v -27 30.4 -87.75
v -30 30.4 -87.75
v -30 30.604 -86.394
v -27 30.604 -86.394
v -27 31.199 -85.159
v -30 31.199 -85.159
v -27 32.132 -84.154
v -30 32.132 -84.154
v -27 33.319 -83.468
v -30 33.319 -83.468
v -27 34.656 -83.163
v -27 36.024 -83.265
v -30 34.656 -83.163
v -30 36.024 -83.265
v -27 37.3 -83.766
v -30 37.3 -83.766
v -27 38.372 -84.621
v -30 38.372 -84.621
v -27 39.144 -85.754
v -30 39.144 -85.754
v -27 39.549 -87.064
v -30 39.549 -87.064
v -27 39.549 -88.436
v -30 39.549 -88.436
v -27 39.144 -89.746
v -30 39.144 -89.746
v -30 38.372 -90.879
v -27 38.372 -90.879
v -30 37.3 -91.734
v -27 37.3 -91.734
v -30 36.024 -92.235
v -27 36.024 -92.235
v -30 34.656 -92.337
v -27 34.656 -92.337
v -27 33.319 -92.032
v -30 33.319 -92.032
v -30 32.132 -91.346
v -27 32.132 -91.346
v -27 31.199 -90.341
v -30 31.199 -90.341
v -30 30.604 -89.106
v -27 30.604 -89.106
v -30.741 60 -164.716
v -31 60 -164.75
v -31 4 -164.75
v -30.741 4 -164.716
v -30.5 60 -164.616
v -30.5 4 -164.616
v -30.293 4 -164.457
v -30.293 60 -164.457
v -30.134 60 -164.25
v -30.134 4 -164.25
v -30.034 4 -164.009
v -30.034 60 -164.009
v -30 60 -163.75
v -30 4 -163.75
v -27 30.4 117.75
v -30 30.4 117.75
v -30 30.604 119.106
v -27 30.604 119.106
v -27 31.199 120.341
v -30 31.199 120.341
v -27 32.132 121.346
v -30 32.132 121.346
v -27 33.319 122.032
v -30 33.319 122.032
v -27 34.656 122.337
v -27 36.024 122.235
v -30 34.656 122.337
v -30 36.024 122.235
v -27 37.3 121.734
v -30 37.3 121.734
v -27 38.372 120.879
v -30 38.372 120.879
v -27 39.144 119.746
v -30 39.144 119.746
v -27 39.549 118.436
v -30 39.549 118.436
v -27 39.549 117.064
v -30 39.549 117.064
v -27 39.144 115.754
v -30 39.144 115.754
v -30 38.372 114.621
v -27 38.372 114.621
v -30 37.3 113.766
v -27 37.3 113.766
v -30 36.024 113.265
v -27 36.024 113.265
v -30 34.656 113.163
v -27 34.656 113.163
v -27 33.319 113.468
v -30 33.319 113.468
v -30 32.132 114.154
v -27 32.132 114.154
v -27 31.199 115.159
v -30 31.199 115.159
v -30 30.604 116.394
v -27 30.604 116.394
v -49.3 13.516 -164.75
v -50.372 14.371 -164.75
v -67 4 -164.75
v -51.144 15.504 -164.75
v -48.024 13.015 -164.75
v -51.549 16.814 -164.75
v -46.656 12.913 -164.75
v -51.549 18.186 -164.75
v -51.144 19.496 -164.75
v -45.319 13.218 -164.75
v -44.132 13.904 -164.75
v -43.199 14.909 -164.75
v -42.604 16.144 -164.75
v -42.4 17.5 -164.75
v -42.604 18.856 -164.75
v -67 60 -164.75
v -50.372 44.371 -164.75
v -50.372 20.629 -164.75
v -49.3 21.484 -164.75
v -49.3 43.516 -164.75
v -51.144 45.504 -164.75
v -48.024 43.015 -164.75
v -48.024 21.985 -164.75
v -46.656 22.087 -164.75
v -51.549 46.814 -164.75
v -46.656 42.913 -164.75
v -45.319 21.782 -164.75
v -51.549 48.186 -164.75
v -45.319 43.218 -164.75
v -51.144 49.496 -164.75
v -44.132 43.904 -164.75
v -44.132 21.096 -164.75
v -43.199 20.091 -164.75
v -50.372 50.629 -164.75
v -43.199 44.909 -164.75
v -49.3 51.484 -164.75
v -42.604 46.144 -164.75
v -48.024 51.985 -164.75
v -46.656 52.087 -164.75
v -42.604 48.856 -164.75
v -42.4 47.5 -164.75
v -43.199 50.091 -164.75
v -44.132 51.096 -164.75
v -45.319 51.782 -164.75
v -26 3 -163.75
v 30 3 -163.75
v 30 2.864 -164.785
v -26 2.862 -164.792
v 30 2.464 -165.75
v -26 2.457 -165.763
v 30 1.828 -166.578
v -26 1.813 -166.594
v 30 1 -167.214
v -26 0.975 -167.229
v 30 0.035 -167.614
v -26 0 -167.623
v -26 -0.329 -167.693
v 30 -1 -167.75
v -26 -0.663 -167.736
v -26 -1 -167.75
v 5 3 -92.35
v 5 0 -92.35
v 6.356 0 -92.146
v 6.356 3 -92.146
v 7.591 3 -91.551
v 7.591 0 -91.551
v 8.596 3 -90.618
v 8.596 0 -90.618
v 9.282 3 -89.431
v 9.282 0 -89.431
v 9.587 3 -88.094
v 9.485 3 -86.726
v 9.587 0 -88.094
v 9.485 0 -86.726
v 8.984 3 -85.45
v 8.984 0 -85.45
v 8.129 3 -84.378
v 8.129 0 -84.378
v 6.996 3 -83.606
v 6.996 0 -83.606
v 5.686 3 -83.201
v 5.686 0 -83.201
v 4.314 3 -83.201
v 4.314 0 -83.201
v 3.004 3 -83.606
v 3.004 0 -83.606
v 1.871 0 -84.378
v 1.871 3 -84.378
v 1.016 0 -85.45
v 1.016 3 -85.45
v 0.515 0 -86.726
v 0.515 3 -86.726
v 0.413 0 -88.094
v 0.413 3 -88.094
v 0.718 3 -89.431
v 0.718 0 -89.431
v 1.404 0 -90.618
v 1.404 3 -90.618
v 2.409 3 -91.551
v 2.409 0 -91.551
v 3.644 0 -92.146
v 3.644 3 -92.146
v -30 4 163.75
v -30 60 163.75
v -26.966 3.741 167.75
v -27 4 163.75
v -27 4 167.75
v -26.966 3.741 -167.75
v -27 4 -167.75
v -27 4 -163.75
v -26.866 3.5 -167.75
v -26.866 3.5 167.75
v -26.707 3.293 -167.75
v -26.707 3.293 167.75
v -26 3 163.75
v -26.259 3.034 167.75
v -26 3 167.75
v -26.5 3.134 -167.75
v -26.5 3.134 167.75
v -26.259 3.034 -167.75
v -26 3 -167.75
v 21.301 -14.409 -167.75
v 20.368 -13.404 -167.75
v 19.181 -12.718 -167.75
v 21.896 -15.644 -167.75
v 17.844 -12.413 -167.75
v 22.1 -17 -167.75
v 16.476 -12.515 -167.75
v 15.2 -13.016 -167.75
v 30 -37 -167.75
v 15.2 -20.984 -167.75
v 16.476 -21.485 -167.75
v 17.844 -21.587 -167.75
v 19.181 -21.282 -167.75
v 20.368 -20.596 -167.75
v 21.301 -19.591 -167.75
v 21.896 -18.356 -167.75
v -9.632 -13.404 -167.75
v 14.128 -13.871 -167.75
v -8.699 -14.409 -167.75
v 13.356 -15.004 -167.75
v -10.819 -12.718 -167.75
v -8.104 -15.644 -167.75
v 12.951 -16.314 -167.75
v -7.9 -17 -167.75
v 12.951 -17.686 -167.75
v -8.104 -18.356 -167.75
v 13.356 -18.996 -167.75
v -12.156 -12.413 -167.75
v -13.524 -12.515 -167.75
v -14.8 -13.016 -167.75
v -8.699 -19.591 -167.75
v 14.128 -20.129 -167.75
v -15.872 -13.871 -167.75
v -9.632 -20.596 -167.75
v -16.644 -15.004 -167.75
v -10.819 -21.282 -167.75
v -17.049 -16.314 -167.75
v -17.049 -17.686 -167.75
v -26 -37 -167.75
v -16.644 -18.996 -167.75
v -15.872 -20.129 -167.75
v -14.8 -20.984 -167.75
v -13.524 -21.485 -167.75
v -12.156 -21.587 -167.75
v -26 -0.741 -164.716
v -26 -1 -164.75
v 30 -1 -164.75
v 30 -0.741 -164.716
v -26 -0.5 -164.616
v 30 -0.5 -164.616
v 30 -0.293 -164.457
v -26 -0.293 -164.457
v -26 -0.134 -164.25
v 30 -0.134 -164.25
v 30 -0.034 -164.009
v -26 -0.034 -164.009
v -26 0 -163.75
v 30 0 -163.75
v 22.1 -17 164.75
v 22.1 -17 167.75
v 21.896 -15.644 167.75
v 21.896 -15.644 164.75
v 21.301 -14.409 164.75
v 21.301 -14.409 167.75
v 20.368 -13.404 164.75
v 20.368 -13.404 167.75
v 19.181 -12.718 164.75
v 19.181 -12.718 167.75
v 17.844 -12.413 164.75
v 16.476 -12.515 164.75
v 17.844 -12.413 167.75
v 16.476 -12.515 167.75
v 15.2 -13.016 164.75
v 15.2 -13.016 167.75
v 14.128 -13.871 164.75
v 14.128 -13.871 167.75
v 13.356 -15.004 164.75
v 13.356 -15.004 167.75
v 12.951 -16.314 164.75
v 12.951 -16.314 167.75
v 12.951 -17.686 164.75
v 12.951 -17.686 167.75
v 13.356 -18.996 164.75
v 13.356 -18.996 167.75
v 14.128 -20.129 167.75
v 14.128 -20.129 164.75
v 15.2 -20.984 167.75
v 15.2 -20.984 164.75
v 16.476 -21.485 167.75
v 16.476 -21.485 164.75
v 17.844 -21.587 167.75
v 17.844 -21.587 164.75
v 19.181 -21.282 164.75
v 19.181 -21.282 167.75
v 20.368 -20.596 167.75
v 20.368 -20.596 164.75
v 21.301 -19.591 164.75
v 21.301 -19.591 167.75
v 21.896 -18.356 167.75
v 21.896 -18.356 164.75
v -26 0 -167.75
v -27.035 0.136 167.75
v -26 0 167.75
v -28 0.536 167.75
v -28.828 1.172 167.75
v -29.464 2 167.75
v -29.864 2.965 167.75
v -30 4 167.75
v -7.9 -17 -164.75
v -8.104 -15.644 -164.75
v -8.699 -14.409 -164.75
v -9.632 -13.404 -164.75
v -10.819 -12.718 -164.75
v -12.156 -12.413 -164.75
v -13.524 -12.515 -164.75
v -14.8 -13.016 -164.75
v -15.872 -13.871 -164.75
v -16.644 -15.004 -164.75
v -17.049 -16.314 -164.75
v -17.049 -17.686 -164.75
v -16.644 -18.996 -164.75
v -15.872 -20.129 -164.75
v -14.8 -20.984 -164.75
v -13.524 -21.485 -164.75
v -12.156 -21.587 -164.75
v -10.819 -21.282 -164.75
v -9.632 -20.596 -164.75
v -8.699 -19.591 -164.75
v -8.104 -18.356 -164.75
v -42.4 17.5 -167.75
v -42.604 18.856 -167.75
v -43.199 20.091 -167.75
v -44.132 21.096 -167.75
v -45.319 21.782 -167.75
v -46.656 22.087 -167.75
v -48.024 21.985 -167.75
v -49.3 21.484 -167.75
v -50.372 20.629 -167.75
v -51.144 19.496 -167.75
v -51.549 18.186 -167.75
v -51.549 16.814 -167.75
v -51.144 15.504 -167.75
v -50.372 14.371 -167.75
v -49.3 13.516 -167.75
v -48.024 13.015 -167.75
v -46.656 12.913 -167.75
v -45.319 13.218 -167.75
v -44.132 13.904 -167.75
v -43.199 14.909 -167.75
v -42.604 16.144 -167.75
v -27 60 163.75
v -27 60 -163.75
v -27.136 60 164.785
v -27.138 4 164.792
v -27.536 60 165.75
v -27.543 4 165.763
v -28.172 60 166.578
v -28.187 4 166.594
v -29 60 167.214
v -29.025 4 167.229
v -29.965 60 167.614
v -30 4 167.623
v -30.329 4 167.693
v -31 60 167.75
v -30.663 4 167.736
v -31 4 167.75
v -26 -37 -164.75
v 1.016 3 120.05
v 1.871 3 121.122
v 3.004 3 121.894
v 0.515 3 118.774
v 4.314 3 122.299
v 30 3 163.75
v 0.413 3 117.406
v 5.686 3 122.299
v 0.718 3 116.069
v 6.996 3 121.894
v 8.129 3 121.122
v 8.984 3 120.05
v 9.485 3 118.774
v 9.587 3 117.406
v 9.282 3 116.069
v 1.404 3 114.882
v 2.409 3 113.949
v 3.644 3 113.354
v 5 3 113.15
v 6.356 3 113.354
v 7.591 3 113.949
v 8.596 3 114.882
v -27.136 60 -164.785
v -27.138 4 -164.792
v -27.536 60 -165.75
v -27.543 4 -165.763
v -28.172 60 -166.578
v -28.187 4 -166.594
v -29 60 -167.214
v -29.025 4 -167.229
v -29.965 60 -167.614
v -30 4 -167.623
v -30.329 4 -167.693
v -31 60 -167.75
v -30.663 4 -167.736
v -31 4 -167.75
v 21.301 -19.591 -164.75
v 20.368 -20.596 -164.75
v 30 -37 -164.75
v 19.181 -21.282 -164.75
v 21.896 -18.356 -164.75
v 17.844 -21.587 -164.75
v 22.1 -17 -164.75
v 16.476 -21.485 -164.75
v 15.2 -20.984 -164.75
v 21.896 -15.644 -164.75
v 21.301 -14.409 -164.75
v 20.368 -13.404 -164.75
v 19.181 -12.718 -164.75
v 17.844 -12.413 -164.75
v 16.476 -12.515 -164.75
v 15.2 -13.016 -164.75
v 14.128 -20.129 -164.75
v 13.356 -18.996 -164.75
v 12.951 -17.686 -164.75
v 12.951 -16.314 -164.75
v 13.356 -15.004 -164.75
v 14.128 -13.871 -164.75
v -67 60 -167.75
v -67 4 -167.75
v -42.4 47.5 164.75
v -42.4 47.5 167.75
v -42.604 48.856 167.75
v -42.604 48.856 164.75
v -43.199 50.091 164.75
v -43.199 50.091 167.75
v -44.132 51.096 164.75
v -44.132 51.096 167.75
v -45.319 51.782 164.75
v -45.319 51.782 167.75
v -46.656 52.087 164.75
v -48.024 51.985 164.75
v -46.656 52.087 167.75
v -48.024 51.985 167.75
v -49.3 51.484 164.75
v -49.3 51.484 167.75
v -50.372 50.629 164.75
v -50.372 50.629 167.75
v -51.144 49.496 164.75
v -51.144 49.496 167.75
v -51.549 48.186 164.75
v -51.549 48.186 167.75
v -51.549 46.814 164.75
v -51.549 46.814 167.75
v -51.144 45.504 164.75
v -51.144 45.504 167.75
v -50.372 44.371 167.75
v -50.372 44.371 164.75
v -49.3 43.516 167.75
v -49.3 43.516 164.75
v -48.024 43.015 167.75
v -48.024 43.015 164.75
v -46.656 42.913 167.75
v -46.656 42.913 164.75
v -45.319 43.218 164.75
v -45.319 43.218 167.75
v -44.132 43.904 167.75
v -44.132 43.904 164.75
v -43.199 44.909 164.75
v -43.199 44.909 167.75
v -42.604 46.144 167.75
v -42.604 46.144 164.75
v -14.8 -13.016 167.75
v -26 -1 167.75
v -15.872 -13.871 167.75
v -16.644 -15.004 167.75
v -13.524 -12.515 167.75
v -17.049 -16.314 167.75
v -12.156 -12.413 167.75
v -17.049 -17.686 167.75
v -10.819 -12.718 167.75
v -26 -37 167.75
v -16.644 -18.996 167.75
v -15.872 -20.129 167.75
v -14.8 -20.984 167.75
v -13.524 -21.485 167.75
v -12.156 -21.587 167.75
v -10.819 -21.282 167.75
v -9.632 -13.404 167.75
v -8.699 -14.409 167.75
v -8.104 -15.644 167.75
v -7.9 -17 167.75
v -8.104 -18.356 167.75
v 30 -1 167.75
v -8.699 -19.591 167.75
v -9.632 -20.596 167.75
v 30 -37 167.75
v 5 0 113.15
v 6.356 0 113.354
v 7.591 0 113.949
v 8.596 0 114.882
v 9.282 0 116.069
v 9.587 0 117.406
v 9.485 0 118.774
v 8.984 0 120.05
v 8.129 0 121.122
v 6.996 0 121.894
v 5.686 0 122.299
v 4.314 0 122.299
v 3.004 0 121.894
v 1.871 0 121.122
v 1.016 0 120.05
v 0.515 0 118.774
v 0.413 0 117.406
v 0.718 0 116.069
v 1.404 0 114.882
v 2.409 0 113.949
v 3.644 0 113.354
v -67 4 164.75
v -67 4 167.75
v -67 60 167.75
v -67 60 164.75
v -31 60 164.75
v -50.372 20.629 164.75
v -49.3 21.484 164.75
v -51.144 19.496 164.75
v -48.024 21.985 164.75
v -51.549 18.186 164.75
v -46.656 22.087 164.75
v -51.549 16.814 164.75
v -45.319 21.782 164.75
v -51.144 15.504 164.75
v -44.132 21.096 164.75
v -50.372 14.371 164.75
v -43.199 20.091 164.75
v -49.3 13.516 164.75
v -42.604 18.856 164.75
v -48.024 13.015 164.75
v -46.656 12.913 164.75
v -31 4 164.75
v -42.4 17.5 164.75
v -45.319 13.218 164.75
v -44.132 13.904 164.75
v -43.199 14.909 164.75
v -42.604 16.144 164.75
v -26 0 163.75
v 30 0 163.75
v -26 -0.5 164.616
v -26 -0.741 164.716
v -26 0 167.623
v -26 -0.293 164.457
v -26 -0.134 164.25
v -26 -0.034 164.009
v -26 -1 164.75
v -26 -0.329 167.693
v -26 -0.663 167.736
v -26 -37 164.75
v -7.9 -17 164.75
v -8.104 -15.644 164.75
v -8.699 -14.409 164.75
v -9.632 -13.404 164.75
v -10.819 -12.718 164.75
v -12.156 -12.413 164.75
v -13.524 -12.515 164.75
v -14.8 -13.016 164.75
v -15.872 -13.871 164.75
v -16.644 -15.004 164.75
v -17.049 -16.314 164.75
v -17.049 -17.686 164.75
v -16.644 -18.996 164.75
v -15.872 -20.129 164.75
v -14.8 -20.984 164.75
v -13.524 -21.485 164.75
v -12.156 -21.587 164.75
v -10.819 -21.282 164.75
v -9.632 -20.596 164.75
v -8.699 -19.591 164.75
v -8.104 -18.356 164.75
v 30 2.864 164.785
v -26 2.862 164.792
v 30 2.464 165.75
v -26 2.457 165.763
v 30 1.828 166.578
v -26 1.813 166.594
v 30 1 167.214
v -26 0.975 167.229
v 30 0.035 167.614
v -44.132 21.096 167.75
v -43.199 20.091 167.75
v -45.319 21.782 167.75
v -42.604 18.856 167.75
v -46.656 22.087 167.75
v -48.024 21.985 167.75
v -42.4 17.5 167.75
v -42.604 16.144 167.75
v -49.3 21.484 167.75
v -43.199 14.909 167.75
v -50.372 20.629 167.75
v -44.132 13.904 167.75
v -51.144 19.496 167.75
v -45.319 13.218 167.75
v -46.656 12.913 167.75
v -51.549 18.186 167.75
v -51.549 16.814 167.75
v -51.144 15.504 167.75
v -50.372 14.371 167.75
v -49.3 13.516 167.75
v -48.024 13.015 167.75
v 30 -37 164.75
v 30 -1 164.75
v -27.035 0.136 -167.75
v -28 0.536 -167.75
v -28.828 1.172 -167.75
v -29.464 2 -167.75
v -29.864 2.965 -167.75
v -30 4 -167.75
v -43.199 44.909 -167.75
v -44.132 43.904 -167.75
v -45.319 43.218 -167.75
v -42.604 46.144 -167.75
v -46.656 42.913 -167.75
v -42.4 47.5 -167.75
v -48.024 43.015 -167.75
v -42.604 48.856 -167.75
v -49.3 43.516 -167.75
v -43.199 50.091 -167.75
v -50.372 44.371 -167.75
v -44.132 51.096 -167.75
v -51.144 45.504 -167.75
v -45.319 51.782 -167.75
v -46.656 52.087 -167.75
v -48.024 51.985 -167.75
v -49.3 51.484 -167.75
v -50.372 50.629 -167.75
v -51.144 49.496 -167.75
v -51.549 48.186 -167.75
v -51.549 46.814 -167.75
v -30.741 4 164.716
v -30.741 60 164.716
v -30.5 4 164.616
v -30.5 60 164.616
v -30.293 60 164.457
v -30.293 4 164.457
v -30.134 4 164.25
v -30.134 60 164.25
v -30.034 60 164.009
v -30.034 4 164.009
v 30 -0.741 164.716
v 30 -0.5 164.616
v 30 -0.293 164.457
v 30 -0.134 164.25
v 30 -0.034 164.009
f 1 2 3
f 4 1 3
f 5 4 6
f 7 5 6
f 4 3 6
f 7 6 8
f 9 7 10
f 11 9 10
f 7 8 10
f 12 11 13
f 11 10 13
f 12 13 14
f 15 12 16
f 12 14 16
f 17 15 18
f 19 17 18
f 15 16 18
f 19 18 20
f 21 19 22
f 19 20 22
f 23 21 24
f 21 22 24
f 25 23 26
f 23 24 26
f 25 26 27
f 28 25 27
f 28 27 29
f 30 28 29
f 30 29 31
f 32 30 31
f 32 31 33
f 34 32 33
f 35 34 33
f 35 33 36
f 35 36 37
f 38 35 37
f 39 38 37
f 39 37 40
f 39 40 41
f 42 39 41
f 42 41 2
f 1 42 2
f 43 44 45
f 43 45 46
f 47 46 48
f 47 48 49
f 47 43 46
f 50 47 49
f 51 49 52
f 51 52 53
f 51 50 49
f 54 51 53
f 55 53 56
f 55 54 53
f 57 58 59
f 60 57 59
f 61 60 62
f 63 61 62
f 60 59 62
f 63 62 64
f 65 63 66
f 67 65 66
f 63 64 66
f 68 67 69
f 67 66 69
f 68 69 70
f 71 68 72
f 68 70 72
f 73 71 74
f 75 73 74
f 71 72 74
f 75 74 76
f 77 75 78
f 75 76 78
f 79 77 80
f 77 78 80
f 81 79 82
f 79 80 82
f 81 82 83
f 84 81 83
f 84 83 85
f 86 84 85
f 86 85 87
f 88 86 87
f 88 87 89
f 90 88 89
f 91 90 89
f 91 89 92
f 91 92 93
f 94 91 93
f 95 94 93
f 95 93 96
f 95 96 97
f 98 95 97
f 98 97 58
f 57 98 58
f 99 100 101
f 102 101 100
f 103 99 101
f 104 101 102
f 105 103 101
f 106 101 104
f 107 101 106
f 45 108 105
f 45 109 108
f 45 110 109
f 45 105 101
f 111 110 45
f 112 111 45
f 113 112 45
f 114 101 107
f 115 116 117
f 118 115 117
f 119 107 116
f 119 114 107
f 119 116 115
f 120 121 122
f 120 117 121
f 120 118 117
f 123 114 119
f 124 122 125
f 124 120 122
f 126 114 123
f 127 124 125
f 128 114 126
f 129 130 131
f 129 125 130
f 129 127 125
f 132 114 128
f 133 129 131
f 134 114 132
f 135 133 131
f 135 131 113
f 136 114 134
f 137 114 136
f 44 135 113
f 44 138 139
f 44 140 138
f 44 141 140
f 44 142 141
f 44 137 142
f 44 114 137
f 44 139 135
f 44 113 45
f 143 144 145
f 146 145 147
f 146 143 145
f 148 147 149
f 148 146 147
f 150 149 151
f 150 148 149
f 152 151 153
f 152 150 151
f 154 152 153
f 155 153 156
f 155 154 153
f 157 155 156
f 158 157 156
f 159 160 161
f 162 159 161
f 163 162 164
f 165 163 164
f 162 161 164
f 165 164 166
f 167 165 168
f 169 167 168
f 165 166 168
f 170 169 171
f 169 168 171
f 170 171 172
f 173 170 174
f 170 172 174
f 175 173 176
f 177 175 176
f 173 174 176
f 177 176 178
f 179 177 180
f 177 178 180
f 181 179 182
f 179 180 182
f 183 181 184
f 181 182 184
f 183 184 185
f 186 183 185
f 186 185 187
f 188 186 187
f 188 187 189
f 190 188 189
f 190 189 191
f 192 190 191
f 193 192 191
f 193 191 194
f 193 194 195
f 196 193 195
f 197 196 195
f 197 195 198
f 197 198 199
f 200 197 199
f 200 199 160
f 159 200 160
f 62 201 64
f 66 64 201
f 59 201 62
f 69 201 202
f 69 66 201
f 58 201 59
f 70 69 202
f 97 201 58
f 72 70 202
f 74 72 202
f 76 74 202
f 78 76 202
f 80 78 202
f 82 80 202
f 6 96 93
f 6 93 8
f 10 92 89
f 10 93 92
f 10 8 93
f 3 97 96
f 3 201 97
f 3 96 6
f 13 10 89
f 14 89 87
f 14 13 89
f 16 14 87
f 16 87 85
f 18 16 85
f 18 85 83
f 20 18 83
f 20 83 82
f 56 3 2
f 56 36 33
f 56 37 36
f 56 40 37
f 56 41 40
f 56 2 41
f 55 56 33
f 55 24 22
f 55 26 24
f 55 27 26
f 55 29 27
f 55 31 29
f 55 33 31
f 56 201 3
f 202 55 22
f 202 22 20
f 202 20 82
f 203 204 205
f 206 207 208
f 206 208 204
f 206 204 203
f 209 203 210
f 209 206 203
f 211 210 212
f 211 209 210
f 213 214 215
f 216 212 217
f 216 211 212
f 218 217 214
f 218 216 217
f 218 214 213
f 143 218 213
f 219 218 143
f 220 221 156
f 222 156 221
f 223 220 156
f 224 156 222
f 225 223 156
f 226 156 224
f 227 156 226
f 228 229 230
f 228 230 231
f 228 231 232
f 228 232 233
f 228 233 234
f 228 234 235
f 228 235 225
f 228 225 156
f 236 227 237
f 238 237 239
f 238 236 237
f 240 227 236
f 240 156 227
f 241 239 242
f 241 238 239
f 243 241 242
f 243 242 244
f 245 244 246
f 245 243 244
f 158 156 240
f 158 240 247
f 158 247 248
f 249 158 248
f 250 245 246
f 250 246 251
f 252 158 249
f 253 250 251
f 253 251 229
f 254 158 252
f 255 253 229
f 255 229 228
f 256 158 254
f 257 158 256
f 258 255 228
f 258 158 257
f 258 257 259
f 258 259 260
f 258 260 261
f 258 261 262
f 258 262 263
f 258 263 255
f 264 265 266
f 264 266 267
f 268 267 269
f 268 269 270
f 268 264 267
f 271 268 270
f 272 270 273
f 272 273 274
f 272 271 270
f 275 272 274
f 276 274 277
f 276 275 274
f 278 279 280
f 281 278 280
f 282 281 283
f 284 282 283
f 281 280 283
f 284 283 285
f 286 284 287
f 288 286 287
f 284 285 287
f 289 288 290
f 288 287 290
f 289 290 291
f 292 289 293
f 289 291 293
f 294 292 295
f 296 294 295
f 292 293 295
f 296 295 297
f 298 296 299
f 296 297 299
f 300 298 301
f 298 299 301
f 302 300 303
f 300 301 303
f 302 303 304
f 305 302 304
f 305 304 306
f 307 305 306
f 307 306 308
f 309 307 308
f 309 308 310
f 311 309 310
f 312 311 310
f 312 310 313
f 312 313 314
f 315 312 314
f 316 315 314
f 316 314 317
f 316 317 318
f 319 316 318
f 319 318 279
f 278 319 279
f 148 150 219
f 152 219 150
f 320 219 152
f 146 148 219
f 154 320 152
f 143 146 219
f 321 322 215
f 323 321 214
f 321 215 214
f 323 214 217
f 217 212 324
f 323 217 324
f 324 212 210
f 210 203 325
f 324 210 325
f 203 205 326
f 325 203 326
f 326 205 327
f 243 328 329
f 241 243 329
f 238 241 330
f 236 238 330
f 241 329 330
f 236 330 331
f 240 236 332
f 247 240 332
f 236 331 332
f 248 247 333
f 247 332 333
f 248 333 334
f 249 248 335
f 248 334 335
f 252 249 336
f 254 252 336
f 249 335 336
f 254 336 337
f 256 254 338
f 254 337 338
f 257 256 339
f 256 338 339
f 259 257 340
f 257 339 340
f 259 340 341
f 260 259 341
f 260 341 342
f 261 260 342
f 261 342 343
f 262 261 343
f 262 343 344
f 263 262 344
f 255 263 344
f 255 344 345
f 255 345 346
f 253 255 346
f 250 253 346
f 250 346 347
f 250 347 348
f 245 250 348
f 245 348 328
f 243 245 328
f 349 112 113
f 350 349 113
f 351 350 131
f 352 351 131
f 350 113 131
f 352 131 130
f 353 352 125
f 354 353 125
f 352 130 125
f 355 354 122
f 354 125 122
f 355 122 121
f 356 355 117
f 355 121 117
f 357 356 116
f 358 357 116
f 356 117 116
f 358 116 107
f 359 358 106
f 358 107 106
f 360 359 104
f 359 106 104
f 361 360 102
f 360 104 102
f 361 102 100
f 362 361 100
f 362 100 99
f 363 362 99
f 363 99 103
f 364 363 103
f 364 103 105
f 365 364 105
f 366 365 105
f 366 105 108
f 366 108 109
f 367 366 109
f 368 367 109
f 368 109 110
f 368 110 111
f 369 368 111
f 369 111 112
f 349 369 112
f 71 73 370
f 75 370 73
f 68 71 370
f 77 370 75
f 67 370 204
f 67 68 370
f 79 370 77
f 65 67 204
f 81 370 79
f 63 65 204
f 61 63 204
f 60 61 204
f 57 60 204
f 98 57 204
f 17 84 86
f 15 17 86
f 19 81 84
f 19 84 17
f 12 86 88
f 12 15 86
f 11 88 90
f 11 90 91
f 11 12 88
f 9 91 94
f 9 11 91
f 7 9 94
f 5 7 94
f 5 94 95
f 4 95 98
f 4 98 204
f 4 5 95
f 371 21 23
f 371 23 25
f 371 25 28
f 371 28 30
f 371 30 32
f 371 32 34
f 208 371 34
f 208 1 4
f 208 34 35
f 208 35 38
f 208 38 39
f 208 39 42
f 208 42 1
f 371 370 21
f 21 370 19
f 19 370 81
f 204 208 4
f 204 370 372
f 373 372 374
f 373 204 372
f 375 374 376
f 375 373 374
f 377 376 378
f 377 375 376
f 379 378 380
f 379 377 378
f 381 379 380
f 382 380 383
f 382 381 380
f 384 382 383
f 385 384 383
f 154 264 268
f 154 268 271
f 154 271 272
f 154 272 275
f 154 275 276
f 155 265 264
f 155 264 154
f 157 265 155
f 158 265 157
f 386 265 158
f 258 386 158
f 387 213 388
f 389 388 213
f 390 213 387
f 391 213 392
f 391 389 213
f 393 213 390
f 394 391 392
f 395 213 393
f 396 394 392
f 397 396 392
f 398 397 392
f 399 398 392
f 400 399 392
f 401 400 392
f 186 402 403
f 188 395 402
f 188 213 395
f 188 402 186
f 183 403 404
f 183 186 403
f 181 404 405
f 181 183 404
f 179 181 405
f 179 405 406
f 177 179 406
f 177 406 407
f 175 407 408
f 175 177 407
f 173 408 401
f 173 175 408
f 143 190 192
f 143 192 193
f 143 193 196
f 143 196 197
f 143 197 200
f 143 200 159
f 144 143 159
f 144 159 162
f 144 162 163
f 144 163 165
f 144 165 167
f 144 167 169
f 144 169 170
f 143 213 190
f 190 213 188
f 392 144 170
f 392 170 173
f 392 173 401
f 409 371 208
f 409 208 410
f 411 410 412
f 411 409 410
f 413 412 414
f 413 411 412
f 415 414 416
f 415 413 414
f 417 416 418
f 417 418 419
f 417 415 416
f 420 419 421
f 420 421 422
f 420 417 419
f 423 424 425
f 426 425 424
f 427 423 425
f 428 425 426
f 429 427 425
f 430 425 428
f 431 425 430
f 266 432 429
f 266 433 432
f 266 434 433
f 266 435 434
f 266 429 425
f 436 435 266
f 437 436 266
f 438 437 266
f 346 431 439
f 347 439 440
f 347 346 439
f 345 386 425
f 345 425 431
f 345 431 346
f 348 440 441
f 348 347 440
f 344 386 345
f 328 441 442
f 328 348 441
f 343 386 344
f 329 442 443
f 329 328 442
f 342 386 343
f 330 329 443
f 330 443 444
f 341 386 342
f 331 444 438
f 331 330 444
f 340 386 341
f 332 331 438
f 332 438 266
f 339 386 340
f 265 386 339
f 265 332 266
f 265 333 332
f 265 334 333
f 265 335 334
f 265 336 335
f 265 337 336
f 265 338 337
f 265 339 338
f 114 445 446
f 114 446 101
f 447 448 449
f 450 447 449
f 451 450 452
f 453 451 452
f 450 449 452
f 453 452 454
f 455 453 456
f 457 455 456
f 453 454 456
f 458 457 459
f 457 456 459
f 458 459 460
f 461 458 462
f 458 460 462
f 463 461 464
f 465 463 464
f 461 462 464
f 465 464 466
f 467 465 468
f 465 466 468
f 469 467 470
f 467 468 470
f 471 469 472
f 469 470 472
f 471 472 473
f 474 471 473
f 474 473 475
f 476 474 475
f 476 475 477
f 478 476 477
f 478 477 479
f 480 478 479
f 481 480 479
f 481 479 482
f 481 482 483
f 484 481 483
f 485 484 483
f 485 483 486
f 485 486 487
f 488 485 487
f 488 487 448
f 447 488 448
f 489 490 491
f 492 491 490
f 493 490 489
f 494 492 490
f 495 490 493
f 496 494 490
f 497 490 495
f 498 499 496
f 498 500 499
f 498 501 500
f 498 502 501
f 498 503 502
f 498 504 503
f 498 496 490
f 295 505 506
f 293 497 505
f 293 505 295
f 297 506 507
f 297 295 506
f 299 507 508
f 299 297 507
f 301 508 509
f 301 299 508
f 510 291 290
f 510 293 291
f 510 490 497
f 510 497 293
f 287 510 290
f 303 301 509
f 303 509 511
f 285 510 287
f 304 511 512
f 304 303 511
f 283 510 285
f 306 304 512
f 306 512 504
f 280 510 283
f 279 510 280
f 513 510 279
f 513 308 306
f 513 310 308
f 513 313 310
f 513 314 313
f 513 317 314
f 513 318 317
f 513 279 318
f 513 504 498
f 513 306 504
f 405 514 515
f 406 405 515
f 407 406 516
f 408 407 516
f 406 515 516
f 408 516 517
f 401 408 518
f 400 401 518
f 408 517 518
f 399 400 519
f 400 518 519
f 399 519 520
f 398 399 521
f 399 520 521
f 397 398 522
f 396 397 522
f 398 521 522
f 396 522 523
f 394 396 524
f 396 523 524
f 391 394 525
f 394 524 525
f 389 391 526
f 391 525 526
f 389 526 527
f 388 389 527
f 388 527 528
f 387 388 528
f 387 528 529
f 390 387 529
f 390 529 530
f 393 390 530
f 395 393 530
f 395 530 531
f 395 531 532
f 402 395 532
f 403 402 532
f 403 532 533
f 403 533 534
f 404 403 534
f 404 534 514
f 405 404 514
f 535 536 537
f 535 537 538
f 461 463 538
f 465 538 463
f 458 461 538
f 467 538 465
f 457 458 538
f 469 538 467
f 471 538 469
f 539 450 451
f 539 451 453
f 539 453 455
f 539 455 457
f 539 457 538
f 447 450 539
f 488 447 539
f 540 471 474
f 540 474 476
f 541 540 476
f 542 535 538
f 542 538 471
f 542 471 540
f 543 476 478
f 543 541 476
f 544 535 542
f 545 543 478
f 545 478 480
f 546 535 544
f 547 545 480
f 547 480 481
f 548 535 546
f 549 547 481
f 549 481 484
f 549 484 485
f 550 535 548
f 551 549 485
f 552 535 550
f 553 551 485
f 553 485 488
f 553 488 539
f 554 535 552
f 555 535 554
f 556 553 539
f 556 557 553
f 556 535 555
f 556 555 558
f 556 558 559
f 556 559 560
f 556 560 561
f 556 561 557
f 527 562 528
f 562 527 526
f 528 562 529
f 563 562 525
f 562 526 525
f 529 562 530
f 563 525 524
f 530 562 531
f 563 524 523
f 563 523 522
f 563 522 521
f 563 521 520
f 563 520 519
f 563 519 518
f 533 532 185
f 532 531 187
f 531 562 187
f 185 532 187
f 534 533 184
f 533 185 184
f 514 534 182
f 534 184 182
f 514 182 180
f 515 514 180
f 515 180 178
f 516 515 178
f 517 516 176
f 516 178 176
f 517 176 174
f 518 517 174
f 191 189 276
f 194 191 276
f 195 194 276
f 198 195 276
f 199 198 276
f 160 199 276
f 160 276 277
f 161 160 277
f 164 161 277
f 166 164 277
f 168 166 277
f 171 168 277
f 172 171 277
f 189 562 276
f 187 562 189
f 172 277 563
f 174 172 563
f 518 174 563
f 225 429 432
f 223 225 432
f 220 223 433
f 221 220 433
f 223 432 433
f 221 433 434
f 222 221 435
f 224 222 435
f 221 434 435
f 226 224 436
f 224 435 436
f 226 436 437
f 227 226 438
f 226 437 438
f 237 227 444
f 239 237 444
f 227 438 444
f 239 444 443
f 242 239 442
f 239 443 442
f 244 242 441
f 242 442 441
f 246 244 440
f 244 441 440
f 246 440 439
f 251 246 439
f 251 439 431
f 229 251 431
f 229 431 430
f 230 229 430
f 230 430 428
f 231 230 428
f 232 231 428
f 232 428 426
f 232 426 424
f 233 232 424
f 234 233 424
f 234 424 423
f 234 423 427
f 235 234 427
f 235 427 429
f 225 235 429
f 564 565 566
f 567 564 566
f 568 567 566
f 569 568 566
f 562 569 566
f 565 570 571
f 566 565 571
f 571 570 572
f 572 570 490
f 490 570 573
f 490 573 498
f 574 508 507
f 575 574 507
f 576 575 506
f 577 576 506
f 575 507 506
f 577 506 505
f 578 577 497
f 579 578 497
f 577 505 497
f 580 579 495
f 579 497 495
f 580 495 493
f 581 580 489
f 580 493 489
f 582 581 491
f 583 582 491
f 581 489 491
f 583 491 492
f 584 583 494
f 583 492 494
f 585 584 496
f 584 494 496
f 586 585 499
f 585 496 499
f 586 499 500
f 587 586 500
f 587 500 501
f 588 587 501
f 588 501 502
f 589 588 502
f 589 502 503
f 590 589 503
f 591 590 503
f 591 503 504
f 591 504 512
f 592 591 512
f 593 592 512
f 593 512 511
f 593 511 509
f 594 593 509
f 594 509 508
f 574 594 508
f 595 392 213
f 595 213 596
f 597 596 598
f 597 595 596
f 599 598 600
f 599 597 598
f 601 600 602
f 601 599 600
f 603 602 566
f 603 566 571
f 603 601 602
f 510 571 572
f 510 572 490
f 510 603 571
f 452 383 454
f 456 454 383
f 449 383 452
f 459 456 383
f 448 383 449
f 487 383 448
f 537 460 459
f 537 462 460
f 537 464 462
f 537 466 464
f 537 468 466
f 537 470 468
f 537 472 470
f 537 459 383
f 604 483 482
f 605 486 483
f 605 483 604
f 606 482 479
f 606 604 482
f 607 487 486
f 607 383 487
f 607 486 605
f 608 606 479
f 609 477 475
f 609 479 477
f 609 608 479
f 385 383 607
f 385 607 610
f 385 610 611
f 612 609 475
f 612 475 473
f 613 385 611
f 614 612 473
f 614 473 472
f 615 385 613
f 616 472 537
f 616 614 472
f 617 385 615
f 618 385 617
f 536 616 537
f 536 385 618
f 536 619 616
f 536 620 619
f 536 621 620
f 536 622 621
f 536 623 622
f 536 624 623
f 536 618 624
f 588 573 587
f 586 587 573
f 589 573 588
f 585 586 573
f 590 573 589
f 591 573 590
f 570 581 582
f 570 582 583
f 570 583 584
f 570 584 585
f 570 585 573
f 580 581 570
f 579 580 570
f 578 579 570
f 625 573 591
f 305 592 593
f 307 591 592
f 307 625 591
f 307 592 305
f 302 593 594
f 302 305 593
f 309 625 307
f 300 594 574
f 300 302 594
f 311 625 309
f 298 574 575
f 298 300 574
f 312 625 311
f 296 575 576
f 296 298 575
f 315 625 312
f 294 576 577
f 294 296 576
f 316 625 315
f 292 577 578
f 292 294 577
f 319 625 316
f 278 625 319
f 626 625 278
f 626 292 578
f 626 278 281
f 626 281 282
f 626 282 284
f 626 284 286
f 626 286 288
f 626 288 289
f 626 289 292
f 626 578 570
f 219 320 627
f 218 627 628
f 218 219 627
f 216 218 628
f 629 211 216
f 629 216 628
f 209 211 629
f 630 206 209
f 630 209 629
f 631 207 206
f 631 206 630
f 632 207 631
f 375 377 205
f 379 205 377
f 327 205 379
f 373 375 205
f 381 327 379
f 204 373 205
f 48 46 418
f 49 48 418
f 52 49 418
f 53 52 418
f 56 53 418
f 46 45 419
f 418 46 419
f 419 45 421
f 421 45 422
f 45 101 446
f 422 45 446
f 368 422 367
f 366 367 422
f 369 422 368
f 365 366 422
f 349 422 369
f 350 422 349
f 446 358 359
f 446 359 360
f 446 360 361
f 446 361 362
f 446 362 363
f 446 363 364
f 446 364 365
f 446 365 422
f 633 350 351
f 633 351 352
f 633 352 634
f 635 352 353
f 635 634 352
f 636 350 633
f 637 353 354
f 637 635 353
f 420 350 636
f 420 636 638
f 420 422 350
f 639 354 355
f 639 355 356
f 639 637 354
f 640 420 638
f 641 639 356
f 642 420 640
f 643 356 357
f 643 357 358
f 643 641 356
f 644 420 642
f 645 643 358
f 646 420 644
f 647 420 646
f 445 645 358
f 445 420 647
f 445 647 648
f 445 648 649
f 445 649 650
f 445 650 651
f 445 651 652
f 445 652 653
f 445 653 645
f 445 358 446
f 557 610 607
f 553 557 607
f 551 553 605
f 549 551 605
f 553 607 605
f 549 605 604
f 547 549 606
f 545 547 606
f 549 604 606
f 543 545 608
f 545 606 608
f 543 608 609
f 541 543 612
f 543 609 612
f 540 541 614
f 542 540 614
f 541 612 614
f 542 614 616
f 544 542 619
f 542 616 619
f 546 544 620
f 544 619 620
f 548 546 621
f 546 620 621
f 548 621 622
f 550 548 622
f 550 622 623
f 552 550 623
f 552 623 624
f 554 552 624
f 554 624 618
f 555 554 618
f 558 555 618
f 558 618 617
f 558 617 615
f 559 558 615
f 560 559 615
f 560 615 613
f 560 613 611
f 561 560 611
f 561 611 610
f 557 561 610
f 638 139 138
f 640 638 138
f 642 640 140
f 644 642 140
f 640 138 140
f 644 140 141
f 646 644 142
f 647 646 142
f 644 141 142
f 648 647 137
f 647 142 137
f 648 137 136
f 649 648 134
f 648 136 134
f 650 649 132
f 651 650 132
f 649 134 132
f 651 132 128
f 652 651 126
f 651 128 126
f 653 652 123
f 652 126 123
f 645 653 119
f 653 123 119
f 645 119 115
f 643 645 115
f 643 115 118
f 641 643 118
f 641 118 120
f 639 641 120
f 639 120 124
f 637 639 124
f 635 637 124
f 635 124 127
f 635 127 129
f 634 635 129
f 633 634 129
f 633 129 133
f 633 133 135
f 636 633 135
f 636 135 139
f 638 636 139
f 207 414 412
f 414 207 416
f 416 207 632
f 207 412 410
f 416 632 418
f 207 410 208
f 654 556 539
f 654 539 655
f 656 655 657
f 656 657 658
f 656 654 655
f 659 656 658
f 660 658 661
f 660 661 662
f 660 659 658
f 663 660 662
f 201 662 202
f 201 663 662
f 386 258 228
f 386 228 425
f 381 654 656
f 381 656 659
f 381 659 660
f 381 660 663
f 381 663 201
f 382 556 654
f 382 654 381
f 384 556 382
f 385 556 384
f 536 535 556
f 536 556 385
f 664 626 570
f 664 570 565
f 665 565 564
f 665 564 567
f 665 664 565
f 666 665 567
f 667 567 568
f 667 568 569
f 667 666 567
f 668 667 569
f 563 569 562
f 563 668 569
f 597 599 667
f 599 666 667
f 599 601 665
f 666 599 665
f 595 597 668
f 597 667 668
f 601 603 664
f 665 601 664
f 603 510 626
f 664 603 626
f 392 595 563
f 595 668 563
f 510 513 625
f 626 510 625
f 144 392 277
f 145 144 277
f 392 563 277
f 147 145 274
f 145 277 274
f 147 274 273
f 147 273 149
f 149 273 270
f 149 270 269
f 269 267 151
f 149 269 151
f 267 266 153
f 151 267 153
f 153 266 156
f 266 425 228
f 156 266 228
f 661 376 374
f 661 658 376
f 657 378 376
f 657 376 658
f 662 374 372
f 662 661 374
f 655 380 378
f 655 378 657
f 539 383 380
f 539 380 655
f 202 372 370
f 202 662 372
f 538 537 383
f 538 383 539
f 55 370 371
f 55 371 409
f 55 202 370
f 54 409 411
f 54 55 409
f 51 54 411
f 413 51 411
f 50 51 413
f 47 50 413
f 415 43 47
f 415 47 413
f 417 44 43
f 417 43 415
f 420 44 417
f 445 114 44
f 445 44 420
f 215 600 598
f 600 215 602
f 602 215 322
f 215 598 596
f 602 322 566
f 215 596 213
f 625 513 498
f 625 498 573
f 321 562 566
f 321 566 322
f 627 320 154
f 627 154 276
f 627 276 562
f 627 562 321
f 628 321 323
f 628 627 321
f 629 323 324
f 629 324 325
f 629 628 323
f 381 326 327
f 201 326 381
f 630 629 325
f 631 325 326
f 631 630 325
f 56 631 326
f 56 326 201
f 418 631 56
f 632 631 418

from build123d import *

# Parameters (mm, degrees)
SKETCH1_W                      = 60
SKETCH1_H                      = 335.5
BASE_FLANGE1_DEPTH             = 3
EDGE_FLANGE1_STRIP_W           = 14
EDGE_FLANGE1_STRIP_H           = 3
EDGE_FLANGE1_STRIP_CUT_DEPTH   = 335.5
EDGE_FLANGE1_DEPTH             = 335.5
EDGE_FLANGE2_STRIP_W           = 14
EDGE_FLANGE2_STRIP_H           = 3
EDGE_FLANGE2_STRIP_CUT_DEPTH   = 56
EDGE_FLANGE2_STRIP_2_W         = 14
EDGE_FLANGE2_STRIP_2_H         = 3
EDGE_FLANGE2_STRIP_CUT_2_DEPTH = 56
EDGE_FLANGE2_STRIP_3_W         = 14
EDGE_FLANGE2_STRIP_3_H         = 3
EDGE_FLANGE2_STRIP_CUT_3_DEPTH = 56
EDGE_FLANGE2_STRIP_4_W         = 14
EDGE_FLANGE2_STRIP_4_H         = 3
EDGE_FLANGE2_STRIP_CUT_4_DEPTH = 56
EDGE_FLANGE2_DEPTH             = 56
EDGE_FLANGE2_BEND_DEPTH        = 56
EDGE_FLANGE2_BEND_2_DEPTH      = 56
EDGE_FLANGE2_BEND_3_DEPTH      = 56
SKETCH18_R                     = 4.6
EXTRUDE1_DEPTH                 = 348.346009046
SKETCH21_R                     = 4.6
CUT_EXTRUDE1_DEPTH             = 10
SKETCH22_R                     = 4.6
CUT_EXTRUDE2_DEPTH             = 10


# Sheet-metal steps are written as plain solids
with BuildPart() as part:
    # Sketch1 → Base-Flange1 (new body)
    with BuildSketch(Plane(origin=(0, 0, 0), x_dir=(1, 0, 0), z_dir=(0, 1, 0))):
        Rectangle(SKETCH1_W, SKETCH1_H)
    extrude(amount=BASE_FLANGE1_DEPTH)

    # Edge-Flange1 strip (across the edge) → Edge-Flange1 strip cut (cut)
    with BuildSketch(Plane(origin=(-30, 3, -167.75), x_dir=(1, 0, 0), z_dir=(0, 0, 1))):
        with Locations((-3, -1.5)):
            Rectangle(EDGE_FLANGE1_STRIP_W, EDGE_FLANGE1_STRIP_H)
    extrude(amount=EDGE_FLANGE1_STRIP_CUT_DEPTH, mode=Mode.SUBTRACT)

    # Edge-Flange1 section (across the edge) → Edge-Flange1 (add)
    with BuildSketch(Plane(origin=(-30, 3, -167.75), x_dir=(1, 0, 0), z_dir=(0, 0, 1))):
        with BuildLine():
            Line((0, 1), (0, 57))
            Line((0, 57), (3, 57))
            Line((3, 57), (3, 1))
            ThreePointArc((3, 1), (3.292893219, 0.292893219), (4, 0))
            Line((4, 0), (4, -3))
            ThreePointArc((4, -3), (1.171572875, -1.828427125), (0, 1))
        make_face()
    extrude(amount=EDGE_FLANGE1_DEPTH)

    # Edge-Flange2 strip (across the edge) → Edge-Flange2 strip cut (cut)
    with BuildSketch(Plane(origin=(-30, 4, 167.75), x_dir=(0, 0, -1), z_dir=(0, 1, 0))):
        with Locations((-3, -1.5)):
            Rectangle(EDGE_FLANGE2_STRIP_W, EDGE_FLANGE2_STRIP_H)
    extrude(amount=EDGE_FLANGE2_STRIP_CUT_DEPTH, mode=Mode.SUBTRACT)

    # Edge-Flange2 strip 2 (across the edge) → Edge-Flange2 strip cut 2 (cut)
    with BuildSketch(Plane(origin=(30, 0, 167.75), x_dir=(0, 0, -1), z_dir=(-1, 0, 0))):
        with Locations((-3, -1.5)):
            Rectangle(EDGE_FLANGE2_STRIP_2_W, EDGE_FLANGE2_STRIP_2_H)
    extrude(amount=EDGE_FLANGE2_STRIP_CUT_2_DEPTH, mode=Mode.SUBTRACT)

    # Edge-Flange2 strip 3 (across the edge) → Edge-Flange2 strip cut 3 (cut)
    with BuildSketch(Plane(origin=(-30, 60, -167.75), x_dir=(0, 0, 1), z_dir=(0, -1, 0))):
        with Locations((-3, -1.5)):
            Rectangle(EDGE_FLANGE2_STRIP_3_W, EDGE_FLANGE2_STRIP_3_H)
    extrude(amount=EDGE_FLANGE2_STRIP_CUT_3_DEPTH, mode=Mode.SUBTRACT)

    # Edge-Flange2 strip 4 (across the edge) → Edge-Flange2 strip cut 4 (cut)
    with BuildSketch(Plane(origin=(-26, 0, -167.75), x_dir=(0, 0, 1), z_dir=(1, 0, 0))):
        with Locations((-3, -1.5)):
            Rectangle(EDGE_FLANGE2_STRIP_4_W, EDGE_FLANGE2_STRIP_4_H)
    extrude(amount=EDGE_FLANGE2_STRIP_CUT_4_DEPTH, mode=Mode.SUBTRACT)

    # Edge-Flange2 section (across the edge) → Edge-Flange2 (add)
    with BuildSketch(Plane(origin=(-30, 4, 167.75), x_dir=(0, 0, -1), z_dir=(0, 1, 0))):
        with BuildLine():
            Line((0, 1), (0, 37))
            Line((0, 37), (3, 37))
            Line((3, 37), (3, 1))
            ThreePointArc((3, 1), (3.292893219, 0.292893219), (4, 0))
            Line((4, 0), (4, -3))
            ThreePointArc((4, -3), (1.171572875, -1.828427125), (0, 1))
        make_face()
    extrude(amount=EDGE_FLANGE2_DEPTH)

    # Edge-Flange2 section 2 (across the edge) → Edge-Flange2 bend (add)
    with BuildSketch(Plane(origin=(30, 0, 167.75), x_dir=(0, 0, -1), z_dir=(-1, 0, 0))):
        with BuildLine():
            Line((0, 1), (0, 37))
            Line((0, 37), (3, 37))
            Line((3, 37), (3, 1))
            ThreePointArc((3, 1), (3.292893219, 0.292893219), (4, 0))
            Line((4, 0), (4, -3))
            ThreePointArc((4, -3), (1.171572875, -1.828427125), (0, 1))
        make_face()
    extrude(amount=EDGE_FLANGE2_BEND_DEPTH)

    # Edge-Flange2 section 3 (across the edge) → Edge-Flange2 bend 2 (add)
    with BuildSketch(Plane(origin=(-30, 60, -167.75), x_dir=(0, 0, 1), z_dir=(0, -1, 0))):
        with BuildLine():
            Line((0, 1), (0, 37))
            Line((0, 37), (3, 37))
            Line((3, 37), (3, 1))
            ThreePointArc((3, 1), (3.292893219, 0.292893219), (4, 0))
            Line((4, 0), (4, -3))
            ThreePointArc((4, -3), (1.171572875, -1.828427125), (0, 1))
        make_face()
    extrude(amount=EDGE_FLANGE2_BEND_2_DEPTH)

    # Edge-Flange2 section 4 (across the edge) → Edge-Flange2 bend 3 (add)
    with BuildSketch(Plane(origin=(-26, 0, -167.75), x_dir=(0, 0, 1), z_dir=(1, 0, 0))):
        with BuildLine():
            Line((0, 1), (0, 37))
            Line((0, 37), (3, 37))
            Line((3, 37), (3, 1))
            ThreePointArc((3, 1), (3.292893219, 0.292893219), (4, 0))
            Line((4, 0), (4, -3))
            ThreePointArc((4, -3), (1.171572875, -1.828427125), (0, 1))
        make_face()
    extrude(amount=EDGE_FLANGE2_BEND_3_DEPTH)

    # Sketch18 → Extrude1 (cut, through all)
    with BuildSketch(Plane.XY.offset(167.75)):
        with Locations((-47, 47.5)):
            Circle(SKETCH18_R)
        with Locations((-47, 17.5)):
            Circle(SKETCH18_R)
        with Locations((-12.5, -17)):
            Circle(SKETCH18_R)
        with Locations((17.5, -17)):
            Circle(SKETCH18_R)
    extrude(amount=-EXTRUDE1_DEPTH, mode=Mode.SUBTRACT)

    # Sketch21 → Cut-Extrude1 (cut)
    with BuildSketch(Plane.XZ):
        with Locations(Location((5, -87.75, 0), (0, 0, 270))):
            Circle(SKETCH21_R)
        with Locations(Location((5, 117.75, 0), (0, 0, 270))):
            Circle(SKETCH21_R)
    extrude(amount=-CUT_EXTRUDE1_DEPTH, mode=Mode.SUBTRACT)

    # Sketch22 → Cut-Extrude2 (cut)
    with BuildSketch(Plane.ZY.offset(30)):
        with Locations(Location((-87.75, 35, 0), (0, 0, 270))):
            Circle(SKETCH22_R)
        with Locations(Location((117.75, 35, 0), (0, 0, 270))):
            Circle(SKETCH22_R)
    extrude(amount=-CUT_EXTRUDE2_DEPTH, mode=Mode.SUBTRACT)


solid = part.part
